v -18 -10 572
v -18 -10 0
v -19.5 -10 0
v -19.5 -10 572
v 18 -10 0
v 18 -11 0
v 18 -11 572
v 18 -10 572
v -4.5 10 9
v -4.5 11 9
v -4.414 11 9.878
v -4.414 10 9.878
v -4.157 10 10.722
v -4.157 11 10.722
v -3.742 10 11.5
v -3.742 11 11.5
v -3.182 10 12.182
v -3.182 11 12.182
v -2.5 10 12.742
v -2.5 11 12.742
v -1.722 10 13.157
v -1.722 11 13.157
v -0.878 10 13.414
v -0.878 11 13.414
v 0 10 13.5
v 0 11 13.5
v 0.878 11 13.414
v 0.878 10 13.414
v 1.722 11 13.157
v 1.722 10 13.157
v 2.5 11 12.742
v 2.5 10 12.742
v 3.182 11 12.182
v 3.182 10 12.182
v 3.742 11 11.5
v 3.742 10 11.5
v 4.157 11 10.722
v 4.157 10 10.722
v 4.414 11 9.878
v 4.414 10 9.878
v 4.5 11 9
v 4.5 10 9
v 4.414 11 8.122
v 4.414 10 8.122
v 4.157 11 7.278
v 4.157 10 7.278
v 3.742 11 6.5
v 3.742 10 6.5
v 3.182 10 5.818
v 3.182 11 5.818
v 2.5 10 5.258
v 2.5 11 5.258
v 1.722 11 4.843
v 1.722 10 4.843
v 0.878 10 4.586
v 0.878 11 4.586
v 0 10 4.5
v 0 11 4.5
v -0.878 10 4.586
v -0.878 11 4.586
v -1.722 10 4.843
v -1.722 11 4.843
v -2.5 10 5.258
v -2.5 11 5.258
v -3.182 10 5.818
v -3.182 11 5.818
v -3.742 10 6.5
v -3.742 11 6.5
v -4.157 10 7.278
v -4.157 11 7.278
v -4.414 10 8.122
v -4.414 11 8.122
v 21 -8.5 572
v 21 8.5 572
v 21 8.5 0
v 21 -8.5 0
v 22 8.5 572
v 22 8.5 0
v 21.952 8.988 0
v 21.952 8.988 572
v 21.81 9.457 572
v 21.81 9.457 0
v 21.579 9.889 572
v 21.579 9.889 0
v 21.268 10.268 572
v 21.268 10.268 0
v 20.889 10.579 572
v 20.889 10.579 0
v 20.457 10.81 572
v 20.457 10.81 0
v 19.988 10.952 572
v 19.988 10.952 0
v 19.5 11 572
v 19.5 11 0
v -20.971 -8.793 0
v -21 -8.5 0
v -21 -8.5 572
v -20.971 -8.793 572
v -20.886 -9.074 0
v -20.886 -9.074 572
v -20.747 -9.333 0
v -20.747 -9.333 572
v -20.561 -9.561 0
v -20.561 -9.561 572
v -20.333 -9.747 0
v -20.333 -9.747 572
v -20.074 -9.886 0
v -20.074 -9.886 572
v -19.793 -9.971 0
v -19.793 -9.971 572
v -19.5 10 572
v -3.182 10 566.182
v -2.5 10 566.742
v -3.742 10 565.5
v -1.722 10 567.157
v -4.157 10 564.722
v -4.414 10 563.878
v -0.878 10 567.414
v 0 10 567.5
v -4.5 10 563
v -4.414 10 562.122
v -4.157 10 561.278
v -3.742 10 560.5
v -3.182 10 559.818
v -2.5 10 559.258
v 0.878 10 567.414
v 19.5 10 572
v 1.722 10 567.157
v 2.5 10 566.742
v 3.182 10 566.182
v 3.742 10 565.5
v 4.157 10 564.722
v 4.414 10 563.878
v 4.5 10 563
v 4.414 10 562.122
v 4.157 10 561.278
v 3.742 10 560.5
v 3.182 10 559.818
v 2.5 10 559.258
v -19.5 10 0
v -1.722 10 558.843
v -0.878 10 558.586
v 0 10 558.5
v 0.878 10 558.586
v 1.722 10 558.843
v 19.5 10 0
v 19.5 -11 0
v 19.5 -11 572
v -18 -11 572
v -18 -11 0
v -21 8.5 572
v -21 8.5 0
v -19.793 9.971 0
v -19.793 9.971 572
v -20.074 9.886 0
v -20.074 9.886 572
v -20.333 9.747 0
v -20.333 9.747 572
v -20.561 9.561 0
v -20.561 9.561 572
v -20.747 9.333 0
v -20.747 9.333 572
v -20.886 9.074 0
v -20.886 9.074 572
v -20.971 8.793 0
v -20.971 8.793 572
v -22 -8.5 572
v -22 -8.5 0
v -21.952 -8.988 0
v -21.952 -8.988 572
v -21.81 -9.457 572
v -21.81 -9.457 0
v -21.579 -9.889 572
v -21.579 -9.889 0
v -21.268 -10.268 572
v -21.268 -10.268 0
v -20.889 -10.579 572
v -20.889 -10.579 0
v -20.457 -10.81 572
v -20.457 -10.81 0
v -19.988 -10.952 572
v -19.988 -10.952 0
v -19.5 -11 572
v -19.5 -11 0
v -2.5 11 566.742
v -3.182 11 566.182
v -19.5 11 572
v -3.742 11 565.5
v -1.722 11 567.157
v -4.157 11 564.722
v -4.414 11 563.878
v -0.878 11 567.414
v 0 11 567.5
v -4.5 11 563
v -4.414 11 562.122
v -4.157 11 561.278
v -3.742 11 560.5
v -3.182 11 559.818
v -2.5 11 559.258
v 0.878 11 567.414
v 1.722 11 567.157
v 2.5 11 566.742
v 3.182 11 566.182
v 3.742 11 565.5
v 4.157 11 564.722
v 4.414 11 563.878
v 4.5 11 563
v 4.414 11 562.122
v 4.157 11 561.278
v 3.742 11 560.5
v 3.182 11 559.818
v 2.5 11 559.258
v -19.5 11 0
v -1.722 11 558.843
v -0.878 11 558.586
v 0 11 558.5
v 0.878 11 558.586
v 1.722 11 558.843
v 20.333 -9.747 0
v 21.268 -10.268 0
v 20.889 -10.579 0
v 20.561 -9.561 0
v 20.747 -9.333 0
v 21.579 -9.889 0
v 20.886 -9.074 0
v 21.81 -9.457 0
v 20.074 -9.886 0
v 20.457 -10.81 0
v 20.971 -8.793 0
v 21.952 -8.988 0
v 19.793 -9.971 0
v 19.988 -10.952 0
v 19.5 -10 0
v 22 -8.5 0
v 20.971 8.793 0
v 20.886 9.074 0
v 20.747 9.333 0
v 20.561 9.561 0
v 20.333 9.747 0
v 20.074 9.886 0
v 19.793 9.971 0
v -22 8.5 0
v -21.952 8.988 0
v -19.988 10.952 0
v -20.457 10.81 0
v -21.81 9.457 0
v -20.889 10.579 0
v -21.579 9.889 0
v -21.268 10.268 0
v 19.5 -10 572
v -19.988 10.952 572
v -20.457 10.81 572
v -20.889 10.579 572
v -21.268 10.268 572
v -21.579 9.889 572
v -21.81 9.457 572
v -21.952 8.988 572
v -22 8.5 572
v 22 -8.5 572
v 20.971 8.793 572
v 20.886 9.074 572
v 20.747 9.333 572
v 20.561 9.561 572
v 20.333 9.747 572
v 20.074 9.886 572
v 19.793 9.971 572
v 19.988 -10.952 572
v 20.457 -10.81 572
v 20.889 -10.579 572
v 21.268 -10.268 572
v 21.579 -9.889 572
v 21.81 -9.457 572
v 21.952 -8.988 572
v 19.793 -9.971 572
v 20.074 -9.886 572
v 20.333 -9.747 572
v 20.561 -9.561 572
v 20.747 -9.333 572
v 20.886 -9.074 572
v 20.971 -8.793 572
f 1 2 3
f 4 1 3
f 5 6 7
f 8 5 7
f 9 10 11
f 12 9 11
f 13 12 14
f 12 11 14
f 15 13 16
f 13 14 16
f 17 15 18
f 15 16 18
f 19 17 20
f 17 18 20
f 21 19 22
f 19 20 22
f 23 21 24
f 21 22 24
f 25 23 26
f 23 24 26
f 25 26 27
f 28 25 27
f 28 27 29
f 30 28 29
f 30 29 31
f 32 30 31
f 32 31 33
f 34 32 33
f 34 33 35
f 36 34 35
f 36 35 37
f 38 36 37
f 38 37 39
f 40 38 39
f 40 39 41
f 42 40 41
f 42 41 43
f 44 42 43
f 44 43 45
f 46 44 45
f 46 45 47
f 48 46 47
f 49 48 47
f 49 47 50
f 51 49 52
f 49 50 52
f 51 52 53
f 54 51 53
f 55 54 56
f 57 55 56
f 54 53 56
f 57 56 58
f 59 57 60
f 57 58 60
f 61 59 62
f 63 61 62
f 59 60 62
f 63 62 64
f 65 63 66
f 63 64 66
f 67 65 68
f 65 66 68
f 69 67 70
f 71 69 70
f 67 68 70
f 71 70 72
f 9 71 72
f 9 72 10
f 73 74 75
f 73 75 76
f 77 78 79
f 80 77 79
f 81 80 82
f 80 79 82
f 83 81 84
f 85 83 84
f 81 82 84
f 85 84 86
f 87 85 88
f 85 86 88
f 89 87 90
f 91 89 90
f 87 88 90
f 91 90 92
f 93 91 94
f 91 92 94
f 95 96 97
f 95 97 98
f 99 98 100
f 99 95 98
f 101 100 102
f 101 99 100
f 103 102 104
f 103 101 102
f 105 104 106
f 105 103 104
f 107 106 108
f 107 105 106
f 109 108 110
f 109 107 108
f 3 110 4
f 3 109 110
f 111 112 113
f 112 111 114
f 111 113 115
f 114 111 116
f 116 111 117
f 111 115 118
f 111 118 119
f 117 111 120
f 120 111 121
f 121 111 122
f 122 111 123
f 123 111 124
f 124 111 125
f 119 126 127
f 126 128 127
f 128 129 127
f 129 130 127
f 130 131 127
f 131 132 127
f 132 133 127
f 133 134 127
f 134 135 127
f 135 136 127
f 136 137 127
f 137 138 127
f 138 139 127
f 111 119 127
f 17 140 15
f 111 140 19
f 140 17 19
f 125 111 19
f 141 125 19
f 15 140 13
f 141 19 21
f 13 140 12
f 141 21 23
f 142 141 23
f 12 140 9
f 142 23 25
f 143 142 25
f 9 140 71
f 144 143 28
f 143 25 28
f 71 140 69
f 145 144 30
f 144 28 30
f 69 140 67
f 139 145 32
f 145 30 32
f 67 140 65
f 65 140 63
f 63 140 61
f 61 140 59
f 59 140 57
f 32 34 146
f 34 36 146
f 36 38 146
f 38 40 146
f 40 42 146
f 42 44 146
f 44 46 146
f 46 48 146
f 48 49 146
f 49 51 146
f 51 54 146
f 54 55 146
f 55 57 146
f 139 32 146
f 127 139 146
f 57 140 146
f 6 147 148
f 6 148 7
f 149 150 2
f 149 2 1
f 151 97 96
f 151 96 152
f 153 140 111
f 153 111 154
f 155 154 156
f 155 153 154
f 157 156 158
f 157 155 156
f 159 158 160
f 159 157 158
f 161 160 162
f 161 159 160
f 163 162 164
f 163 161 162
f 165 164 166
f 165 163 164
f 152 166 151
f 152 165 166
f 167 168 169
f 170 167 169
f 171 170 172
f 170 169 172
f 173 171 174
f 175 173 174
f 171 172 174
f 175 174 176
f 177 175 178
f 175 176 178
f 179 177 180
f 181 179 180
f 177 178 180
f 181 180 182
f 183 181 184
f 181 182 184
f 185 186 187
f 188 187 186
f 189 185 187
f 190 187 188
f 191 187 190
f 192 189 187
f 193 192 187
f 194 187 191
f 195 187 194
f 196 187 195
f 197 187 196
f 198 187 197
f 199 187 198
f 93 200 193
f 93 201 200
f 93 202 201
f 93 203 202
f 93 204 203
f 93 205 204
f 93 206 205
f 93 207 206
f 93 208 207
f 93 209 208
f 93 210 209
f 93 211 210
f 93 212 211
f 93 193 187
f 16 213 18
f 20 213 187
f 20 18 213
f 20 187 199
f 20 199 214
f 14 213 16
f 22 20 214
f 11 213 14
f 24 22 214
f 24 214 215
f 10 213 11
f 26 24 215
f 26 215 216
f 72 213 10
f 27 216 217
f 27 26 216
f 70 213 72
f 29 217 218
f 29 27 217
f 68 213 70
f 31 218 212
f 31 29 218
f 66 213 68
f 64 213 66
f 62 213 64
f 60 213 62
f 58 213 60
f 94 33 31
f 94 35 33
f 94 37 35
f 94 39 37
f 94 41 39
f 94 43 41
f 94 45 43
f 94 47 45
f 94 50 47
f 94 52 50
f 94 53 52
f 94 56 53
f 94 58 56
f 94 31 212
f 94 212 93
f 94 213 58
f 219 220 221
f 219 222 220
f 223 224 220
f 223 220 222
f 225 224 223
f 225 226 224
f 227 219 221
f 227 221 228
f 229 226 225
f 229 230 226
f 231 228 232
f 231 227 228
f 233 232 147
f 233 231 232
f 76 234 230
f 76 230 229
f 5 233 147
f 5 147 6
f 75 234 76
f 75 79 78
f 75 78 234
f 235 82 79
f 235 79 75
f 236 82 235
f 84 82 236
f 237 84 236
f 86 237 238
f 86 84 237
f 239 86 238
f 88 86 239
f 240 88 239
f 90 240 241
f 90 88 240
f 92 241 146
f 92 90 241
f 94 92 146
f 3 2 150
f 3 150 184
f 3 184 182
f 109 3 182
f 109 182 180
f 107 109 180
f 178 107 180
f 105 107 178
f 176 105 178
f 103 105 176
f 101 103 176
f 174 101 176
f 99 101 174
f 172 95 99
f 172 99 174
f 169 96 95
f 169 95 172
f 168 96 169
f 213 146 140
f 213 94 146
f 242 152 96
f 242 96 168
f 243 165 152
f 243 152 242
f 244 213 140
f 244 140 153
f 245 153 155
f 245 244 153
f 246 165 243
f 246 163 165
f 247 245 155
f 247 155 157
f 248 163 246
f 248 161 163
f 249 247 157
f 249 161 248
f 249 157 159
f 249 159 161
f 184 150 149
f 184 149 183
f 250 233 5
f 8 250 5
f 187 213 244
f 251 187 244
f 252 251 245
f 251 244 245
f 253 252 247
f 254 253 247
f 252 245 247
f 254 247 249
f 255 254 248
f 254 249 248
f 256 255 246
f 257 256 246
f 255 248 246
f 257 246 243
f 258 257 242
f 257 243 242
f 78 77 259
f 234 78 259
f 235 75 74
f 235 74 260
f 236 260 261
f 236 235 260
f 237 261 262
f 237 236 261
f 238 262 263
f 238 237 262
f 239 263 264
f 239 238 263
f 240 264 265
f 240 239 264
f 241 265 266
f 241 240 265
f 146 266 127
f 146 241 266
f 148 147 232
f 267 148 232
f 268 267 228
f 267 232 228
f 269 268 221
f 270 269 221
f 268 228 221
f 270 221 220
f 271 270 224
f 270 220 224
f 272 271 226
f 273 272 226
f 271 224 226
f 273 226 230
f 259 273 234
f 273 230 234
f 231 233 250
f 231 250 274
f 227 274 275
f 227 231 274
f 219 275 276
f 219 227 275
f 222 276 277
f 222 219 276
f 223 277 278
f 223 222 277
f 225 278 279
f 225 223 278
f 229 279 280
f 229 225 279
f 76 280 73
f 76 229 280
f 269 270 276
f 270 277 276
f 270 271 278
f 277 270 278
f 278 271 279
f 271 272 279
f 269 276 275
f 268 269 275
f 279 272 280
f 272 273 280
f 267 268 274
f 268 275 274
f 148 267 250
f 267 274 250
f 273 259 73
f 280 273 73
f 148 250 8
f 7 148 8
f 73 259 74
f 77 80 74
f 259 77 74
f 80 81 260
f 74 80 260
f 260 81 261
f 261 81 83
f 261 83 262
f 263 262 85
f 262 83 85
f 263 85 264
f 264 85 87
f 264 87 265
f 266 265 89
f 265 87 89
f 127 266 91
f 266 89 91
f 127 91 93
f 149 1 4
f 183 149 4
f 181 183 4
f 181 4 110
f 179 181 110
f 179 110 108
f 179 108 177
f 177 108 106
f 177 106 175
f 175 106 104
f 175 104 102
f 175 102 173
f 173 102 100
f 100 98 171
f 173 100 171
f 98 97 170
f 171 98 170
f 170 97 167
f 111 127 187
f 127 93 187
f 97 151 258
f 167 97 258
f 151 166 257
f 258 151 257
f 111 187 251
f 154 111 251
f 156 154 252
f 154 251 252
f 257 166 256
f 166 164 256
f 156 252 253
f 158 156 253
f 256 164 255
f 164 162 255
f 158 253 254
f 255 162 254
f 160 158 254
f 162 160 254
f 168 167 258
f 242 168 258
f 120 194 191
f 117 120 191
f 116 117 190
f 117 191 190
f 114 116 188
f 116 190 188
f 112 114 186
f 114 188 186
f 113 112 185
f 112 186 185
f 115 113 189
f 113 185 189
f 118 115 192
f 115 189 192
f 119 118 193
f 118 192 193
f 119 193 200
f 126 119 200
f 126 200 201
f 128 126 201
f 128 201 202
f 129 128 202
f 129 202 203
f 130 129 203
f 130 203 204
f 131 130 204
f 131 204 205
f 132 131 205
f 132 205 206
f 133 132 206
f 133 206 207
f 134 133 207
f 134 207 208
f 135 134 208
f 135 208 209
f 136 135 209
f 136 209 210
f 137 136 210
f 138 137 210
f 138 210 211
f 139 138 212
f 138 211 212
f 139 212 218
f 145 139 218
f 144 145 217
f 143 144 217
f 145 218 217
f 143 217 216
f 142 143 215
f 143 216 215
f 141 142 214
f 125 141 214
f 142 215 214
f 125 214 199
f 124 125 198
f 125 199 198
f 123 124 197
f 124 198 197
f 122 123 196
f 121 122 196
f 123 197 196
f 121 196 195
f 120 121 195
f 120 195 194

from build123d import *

# Parameters (mm, degrees)
PAD001_DEPTH    = 572
SKETCH004_R     = 4.5
POCKET002_DEPTH = 5
SKETCH007_W     = 36
SKETCH007_H     = 572
POCKET004_DEPTH = 5


with BuildPart() as part:
    # Sketch003 → Pad001 (new body)
    with BuildSketch(Plane.XY):
        with BuildLine():
            Line((-19.5, 11), (19.5, 11))
            ThreePointArc((22, 8.5), (21.267767, 10.267767), (19.5, 11))
            Line((22, 8.5), (22, -8.5))
            ThreePointArc((19.5, -11), (21.267767, -10.267767), (22, -8.5))
            Line((19.5, -11), (-19.5, -11))
            ThreePointArc((-22, -8.5), (-21.267767, -10.267767), (-19.5, -11))
            Line((-22, -8.5), (-22, 8.5))
            ThreePointArc((-19.5, 11), (-21.267767, 10.267767), (-22, 8.5))
        make_face()
        with BuildLine():
            Line((-19.5, 10), (19.5, 10))
            ThreePointArc((21, 8.5), (20.56066, 9.56066), (19.5, 10))
            Line((21, 8.5), (21, -8.5))
            ThreePointArc((19.5, -10), (20.56066, -9.56066), (21, -8.5))
            Line((19.5, -10), (-19.5, -10))
            ThreePointArc((-21, -8.5), (-20.56066, -9.56066), (-19.5, -10))
            Line((-21, -8.5), (-21, 8.5))
            ThreePointArc((-19.5, 10), (-20.56066, 9.56066), (-21, 8.5))
        make_face(mode=Mode.SUBTRACT)
    extrude(amount=PAD001_DEPTH)

    # Sketch004 (on Face3 of Pad001) → Pocket002 (cut)
    with BuildSketch(Plane(origin=(0, 11, 0), x_dir=(-1, 0, 0), z_dir=(0, 1, 0))):
        with Locations((0, 9)):
            Circle(SKETCH004_R)
        with Locations((0, 563)):
            Circle(SKETCH004_R)
    extrude(amount=-POCKET002_DEPTH, mode=Mode.SUBTRACT)

    # Sketch007 (on Face6 of Pocket002) → Pocket004 (cut)
    with BuildSketch(Plane.XZ.offset(11)):
        with Locations((0, 286)):
            Rectangle(SKETCH007_W, SKETCH007_H)
    extrude(amount=-POCKET004_DEPTH, mode=Mode.SUBTRACT)


solid = part.part
